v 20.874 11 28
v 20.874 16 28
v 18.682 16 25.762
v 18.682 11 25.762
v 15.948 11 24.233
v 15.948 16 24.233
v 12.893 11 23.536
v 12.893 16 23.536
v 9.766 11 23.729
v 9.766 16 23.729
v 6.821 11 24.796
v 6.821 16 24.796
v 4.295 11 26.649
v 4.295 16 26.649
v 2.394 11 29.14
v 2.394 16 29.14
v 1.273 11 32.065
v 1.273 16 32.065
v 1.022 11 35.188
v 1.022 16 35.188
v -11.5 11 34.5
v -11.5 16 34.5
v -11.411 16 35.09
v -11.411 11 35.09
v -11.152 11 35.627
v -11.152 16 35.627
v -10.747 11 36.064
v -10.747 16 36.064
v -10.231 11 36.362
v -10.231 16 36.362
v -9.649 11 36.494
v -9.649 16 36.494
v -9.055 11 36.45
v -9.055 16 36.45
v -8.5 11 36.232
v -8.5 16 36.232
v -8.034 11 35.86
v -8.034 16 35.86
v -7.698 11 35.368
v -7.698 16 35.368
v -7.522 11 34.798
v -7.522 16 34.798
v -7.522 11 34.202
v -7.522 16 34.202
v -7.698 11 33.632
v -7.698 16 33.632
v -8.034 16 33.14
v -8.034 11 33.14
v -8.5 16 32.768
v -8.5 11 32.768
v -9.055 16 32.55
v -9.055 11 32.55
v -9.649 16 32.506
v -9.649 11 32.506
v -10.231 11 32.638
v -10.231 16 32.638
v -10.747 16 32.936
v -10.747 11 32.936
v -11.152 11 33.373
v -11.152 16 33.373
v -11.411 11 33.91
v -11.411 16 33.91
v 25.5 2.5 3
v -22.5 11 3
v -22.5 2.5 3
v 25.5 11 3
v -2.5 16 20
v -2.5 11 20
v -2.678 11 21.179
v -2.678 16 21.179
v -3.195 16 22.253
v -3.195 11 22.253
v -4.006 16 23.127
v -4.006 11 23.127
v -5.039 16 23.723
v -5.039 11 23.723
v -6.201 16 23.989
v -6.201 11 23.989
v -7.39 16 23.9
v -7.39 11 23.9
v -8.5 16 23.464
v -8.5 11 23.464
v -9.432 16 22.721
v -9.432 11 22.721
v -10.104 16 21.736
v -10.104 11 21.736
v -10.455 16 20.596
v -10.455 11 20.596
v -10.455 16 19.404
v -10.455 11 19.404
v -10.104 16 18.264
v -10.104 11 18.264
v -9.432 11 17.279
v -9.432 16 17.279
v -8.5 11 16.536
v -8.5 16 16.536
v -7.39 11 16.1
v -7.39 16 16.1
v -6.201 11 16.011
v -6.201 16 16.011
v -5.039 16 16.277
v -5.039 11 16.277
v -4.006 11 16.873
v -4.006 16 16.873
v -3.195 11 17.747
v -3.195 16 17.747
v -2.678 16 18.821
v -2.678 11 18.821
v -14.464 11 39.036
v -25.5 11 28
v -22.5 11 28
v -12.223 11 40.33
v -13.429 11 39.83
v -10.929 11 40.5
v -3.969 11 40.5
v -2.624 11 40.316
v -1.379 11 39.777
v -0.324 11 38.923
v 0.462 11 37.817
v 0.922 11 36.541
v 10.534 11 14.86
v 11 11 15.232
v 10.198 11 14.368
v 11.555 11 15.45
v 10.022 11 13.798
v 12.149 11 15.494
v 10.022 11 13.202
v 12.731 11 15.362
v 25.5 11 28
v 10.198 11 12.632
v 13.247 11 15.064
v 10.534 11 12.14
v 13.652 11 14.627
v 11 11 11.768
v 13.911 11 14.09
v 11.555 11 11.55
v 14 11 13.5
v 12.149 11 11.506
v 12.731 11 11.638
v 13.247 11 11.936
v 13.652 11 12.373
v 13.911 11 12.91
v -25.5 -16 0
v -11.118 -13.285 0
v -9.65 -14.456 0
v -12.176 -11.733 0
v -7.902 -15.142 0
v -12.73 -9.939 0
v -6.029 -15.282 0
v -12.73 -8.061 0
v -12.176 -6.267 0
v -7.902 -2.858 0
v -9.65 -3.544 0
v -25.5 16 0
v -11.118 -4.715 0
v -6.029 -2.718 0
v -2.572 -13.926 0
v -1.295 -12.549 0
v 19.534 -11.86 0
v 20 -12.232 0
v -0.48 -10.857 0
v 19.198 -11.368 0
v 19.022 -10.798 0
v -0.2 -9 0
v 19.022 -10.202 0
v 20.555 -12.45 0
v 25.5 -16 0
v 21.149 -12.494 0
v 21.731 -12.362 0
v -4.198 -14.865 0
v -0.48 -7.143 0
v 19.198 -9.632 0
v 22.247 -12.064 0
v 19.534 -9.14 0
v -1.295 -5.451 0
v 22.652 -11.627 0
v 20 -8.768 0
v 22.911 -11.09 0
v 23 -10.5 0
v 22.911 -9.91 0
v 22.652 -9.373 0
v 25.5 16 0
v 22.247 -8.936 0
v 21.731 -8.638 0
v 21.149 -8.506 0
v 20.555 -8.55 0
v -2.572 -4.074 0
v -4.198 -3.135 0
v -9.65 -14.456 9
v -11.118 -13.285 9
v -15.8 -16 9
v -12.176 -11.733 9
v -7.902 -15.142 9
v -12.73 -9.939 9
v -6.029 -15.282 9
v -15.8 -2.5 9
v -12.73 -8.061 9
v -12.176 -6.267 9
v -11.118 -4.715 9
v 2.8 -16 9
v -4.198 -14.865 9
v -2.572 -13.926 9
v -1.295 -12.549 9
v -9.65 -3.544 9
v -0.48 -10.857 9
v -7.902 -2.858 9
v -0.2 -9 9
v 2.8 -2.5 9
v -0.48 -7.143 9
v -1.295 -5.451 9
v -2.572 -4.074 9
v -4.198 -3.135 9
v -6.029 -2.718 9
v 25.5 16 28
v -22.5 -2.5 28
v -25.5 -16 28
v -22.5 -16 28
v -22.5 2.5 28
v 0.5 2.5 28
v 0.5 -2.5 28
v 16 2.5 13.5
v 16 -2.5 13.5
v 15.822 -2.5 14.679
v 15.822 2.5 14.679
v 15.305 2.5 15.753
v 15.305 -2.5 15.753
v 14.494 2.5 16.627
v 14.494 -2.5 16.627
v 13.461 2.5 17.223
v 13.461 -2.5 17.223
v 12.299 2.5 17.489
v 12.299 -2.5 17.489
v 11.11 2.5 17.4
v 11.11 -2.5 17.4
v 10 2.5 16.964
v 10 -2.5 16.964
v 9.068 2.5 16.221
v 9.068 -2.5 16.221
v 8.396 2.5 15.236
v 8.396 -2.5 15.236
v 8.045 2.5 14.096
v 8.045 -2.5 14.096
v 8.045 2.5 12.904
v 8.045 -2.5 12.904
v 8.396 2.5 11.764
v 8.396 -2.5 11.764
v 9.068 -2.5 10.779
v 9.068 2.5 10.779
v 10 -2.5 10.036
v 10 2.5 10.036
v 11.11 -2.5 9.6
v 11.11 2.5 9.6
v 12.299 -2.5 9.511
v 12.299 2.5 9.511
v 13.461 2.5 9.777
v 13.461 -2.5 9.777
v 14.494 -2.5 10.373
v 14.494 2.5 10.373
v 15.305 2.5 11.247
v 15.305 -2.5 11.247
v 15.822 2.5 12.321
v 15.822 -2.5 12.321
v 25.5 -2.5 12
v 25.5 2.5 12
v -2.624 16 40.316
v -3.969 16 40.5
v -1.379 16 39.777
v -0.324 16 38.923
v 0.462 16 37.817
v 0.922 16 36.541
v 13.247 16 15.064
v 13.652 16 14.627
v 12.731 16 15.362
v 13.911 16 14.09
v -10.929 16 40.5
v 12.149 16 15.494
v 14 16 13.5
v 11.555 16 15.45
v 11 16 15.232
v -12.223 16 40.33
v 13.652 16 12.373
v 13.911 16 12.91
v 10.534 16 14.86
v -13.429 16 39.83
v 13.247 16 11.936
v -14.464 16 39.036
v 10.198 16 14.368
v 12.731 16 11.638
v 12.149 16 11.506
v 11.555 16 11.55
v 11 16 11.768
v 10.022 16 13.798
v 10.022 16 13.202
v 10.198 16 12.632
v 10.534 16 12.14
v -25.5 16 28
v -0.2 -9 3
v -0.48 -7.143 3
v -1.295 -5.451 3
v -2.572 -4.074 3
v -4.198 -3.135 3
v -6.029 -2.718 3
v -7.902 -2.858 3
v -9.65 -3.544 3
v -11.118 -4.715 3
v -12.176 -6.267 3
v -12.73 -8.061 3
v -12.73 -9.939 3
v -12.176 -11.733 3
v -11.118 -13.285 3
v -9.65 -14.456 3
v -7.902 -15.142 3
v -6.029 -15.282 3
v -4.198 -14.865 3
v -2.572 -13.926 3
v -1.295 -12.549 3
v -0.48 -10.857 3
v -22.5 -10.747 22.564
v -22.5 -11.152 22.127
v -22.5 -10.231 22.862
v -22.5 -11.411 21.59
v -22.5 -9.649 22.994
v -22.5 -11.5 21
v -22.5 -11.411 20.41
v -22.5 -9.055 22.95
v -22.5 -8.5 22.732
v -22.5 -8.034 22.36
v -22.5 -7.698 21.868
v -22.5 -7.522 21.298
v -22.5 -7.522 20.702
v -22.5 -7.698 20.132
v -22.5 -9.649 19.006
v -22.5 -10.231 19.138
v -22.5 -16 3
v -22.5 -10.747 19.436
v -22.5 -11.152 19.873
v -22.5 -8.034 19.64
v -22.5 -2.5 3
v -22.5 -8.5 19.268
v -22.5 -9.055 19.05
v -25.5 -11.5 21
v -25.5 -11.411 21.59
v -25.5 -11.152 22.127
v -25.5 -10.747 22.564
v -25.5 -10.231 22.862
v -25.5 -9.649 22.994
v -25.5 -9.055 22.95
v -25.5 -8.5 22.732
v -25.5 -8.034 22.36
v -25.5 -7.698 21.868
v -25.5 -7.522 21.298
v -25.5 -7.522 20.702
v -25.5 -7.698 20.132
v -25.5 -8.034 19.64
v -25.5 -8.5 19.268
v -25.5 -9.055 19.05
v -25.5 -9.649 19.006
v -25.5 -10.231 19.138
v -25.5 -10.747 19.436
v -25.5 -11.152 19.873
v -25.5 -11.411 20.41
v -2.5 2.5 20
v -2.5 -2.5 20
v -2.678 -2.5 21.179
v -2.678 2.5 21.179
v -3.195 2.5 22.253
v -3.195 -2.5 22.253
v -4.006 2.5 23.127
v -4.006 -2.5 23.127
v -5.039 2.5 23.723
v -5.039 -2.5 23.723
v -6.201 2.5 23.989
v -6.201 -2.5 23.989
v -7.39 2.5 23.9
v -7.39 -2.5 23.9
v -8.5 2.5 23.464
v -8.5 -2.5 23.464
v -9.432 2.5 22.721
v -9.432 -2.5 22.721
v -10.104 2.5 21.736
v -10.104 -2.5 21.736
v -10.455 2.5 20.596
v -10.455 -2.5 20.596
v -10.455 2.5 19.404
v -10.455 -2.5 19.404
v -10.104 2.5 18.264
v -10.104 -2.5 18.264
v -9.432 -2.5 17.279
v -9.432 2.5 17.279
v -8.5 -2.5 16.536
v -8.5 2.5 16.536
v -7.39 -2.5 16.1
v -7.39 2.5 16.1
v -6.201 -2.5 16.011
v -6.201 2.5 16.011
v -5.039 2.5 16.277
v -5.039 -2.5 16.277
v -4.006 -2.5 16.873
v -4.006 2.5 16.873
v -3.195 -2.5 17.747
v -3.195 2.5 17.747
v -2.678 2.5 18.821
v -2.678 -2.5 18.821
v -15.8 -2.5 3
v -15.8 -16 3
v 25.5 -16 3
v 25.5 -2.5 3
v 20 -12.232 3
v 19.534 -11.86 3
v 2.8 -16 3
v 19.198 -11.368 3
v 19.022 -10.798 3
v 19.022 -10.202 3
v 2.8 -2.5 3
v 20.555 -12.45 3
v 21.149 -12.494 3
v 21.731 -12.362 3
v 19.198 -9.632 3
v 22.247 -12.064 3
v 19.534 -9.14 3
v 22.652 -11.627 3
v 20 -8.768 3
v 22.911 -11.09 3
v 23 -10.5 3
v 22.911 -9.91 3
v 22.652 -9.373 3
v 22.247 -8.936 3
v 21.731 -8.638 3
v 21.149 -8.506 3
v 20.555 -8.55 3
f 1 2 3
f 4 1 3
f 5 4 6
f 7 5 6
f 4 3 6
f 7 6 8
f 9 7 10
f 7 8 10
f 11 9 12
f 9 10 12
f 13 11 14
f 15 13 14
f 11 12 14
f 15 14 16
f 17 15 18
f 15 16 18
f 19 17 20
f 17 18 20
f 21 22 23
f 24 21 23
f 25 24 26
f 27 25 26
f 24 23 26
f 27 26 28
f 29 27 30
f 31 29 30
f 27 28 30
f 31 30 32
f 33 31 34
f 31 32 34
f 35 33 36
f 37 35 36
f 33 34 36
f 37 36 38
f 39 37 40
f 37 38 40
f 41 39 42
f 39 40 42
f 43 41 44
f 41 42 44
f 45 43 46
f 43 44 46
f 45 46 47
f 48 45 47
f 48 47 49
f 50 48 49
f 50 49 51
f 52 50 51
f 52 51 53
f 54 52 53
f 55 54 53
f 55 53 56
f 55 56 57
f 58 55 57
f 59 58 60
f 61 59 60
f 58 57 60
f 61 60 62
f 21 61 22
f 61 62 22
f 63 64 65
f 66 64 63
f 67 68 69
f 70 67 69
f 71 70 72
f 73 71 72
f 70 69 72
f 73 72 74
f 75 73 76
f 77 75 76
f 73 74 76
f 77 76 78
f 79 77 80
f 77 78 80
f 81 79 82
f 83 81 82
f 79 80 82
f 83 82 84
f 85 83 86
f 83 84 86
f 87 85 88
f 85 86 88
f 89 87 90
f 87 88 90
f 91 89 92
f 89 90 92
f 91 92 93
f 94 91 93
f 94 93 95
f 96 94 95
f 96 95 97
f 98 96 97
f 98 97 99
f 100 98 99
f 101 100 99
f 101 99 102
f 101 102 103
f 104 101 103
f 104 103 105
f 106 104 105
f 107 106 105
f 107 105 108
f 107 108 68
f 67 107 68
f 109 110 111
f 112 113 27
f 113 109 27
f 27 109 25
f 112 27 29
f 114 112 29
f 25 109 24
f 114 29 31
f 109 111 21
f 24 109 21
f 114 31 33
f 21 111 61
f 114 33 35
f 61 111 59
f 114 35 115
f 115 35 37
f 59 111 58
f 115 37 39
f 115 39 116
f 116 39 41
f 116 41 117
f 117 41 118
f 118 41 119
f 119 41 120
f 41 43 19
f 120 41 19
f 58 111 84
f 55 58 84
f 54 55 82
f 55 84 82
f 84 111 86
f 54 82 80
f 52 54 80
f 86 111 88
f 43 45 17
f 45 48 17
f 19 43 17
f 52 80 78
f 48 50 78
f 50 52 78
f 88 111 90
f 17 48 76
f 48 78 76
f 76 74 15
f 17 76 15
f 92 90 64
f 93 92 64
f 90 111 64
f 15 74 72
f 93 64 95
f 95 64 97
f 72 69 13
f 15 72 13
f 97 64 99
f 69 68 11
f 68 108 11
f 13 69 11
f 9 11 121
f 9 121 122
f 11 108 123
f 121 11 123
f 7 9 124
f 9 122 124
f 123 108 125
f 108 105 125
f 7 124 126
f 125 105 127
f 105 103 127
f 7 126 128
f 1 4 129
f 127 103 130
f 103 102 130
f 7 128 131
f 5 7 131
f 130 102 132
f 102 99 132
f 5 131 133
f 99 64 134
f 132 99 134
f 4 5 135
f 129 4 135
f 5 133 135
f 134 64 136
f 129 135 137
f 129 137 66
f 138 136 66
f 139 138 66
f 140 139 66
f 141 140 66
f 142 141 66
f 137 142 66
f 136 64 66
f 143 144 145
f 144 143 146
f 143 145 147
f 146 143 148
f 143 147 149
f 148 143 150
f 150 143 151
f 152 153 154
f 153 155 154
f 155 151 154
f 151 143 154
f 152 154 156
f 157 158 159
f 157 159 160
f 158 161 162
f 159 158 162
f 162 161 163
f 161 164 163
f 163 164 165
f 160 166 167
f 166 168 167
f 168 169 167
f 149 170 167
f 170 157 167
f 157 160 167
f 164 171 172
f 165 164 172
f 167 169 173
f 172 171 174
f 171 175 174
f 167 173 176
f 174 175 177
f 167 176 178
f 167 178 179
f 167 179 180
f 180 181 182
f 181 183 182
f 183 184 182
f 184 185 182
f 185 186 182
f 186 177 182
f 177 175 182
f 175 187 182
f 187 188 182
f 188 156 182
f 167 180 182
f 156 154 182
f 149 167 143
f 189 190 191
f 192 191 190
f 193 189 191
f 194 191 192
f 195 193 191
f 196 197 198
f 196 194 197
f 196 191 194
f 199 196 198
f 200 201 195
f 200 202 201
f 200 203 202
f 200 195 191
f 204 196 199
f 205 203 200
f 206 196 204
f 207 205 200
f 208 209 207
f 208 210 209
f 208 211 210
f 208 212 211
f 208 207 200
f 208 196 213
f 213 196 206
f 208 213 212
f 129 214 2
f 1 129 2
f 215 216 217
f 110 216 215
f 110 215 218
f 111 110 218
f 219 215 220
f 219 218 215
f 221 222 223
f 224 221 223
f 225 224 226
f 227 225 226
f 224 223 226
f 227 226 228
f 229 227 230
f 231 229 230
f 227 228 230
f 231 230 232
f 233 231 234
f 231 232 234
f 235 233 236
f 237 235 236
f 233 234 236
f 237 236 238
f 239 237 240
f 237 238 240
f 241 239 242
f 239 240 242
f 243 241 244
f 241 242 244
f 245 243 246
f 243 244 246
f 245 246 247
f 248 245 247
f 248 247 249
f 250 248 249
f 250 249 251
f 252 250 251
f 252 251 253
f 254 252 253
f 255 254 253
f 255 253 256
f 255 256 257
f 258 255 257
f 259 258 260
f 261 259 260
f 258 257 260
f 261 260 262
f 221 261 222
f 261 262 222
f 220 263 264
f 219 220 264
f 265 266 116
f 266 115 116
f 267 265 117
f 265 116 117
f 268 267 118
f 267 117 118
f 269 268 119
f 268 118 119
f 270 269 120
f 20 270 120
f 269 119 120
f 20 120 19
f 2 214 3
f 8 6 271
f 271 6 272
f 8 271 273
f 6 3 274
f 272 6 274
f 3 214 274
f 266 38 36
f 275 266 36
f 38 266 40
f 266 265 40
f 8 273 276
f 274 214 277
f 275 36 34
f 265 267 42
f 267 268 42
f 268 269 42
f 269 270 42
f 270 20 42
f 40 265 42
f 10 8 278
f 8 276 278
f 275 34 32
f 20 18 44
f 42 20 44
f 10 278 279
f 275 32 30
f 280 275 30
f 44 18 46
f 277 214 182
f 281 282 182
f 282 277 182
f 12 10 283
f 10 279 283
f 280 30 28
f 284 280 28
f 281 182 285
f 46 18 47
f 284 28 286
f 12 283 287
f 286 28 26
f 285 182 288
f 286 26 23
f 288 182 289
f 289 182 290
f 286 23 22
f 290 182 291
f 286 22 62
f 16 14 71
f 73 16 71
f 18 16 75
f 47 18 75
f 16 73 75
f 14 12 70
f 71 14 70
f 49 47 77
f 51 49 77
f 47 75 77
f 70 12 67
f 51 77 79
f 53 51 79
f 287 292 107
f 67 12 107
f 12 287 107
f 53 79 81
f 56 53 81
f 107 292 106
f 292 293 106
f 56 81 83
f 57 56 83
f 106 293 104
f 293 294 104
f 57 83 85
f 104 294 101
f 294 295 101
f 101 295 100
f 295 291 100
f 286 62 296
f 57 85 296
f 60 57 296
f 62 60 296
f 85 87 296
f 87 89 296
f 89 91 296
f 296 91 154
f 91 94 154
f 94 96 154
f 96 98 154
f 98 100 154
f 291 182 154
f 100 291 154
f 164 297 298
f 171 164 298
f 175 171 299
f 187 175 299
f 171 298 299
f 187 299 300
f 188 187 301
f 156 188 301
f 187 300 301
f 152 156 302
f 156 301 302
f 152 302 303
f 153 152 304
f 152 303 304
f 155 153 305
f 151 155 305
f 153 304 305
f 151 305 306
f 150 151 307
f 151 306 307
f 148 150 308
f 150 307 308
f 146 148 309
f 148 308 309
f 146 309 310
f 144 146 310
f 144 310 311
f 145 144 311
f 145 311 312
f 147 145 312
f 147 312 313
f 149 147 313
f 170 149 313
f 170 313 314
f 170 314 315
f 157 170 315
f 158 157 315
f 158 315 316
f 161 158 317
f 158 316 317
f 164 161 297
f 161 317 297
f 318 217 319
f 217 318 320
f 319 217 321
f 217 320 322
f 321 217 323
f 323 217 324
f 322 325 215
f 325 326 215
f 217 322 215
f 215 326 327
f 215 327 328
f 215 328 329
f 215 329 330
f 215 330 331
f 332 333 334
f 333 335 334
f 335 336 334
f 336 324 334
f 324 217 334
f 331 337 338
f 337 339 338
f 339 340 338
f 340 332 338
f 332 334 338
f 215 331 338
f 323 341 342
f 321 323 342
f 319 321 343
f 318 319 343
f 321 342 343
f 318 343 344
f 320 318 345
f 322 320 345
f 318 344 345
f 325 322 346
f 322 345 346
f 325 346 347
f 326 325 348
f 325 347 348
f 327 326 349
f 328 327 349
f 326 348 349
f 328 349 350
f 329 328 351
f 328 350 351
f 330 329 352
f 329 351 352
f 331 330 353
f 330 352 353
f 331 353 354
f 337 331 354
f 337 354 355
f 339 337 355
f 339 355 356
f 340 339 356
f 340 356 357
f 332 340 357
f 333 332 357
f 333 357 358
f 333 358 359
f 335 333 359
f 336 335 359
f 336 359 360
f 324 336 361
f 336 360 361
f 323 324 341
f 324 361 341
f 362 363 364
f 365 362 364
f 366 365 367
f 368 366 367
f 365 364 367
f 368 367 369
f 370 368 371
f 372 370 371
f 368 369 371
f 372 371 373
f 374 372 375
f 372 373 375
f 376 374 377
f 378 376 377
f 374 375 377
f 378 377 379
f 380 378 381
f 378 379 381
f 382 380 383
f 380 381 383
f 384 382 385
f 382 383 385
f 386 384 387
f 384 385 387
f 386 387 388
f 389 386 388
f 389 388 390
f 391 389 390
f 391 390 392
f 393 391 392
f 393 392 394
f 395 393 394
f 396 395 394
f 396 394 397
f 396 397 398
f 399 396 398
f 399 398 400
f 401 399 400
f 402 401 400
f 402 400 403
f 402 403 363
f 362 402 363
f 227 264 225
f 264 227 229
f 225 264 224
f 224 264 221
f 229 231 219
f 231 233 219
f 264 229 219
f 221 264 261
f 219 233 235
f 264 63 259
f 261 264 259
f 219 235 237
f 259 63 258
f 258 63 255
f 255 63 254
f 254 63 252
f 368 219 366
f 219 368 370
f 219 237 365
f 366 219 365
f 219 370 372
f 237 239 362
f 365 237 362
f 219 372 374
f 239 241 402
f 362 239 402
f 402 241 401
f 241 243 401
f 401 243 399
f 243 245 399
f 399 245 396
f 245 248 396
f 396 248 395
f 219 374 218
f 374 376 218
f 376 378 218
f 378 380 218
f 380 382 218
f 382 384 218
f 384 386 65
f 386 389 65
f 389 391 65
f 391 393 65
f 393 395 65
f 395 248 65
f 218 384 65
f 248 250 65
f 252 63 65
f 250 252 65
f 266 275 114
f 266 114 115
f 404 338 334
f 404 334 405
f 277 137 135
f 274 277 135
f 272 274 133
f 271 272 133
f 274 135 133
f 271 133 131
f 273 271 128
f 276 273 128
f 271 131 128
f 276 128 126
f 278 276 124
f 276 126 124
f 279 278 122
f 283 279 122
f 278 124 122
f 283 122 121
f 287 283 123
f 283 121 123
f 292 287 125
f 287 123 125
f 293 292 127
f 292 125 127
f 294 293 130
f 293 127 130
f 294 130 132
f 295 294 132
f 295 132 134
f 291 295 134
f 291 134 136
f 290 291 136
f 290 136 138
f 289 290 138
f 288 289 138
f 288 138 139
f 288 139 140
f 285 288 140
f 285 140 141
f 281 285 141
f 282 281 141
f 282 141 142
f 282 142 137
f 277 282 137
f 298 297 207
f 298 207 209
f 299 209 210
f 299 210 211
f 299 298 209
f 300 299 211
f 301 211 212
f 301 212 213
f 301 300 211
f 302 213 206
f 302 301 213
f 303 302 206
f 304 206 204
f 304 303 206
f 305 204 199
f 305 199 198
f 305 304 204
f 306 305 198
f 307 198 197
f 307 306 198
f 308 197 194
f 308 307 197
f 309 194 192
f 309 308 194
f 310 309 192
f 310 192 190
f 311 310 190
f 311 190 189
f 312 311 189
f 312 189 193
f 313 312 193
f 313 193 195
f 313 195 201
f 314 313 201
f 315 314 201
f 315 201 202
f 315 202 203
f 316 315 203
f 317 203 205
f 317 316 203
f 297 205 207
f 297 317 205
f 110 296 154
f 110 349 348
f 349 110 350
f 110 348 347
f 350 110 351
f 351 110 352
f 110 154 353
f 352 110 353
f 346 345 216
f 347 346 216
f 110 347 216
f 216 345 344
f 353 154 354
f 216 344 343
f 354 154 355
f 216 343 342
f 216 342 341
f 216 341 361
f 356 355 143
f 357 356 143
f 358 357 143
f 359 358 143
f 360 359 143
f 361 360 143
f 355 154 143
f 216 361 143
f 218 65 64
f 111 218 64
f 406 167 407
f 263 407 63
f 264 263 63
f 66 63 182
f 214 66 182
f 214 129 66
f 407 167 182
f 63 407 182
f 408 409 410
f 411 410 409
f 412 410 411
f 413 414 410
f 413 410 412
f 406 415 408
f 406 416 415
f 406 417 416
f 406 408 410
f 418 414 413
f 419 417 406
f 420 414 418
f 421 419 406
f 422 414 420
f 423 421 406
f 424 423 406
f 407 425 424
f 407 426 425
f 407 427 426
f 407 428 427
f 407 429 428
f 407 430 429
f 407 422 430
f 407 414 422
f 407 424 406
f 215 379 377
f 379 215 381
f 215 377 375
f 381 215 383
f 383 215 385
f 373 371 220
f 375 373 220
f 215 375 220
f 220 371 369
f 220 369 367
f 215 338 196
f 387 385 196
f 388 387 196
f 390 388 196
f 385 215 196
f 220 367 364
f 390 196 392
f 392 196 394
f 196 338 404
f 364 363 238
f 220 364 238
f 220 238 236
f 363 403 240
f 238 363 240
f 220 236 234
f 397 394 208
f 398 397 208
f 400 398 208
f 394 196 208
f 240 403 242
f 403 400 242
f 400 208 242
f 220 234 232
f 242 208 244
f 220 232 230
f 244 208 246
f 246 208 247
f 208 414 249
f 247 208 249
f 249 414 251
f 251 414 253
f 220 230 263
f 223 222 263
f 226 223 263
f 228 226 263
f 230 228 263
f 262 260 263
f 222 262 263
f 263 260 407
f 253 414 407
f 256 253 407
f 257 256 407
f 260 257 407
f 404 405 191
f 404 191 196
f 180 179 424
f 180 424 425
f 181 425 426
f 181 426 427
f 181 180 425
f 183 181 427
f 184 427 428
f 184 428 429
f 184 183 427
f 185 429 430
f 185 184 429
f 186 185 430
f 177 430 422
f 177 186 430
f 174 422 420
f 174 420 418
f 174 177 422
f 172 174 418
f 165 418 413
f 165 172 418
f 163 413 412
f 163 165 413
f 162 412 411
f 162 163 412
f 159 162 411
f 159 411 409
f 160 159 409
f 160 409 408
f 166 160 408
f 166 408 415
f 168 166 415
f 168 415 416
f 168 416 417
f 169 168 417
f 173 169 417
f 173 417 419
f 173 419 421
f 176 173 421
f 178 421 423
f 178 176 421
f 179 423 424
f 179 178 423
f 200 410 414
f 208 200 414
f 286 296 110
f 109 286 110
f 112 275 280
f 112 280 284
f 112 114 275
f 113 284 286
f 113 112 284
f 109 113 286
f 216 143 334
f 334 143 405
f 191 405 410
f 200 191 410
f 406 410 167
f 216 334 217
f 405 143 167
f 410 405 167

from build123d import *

# Parameters (mm, degrees)
F0_W      = 51
F0_H      = 32
F0_R      = 2
F1_DEPTH  = 3
F3_DEPTH  = 25
F2_W      = 18.6
F2_H      = 13.5
F2_R      = 6.3
F4_DEPTH  = 6
F5_DEPTH  = 3
F6_SIZE2  = 16
F6_SIZE   = 25
F7_R      = 4
F8_DEPTH  = 18.501
F7_R_2    = 2
F9_DEPTH  = 18.501
F10_DEPTH = 5
F12_DEPTH = 12.5
F13_R     = 2
F14_DEPTH = 5
F15_SIZE  = 12.5
F16_R     = 5
F17_R     = 2
F18_DEPTH = 3


with BuildPart() as f1:
    # F0 (on Top) → F1 (new body)
    with BuildSketch(Plane.XY):
        Rectangle(F0_W, F0_H)
        with Locations((21, -10.5)):
            Circle(F0_R, mode=Mode.SUBTRACT)
    extrude(amount=F1_DEPTH)

    # F2 (on face) → F3 (join)
    with BuildSketch(Plane.XY.offset(3)):
        Polygon((-22.5, 2.5), (-22.5, 11), (25.5, 11), (25.5, 16), (-25.5, 16), (-25.5, -16), (-22.5, -16), (-22.5, -2.5), (-15.8, -2.5), (2.8, -2.5), (25.5, -2.5), (25.5, 2.5), align=None)
    extrude(amount=F3_DEPTH)

    # F2 (on face) → F4 (join)
    with BuildSketch(Plane.XY.offset(3)):
        with Locations((-6.5, -9.25)):
            Rectangle(F2_W, F2_H)
        with Locations((-6.5, -9)):
            Circle(F2_R, mode=Mode.SUBTRACT)
    extrude(amount=F4_DEPTH)

    # F5 (cut, through all): a face of the model
    f5_faces = [f1.faces().sort_by_distance(p)[0] for p in [
        (-6.5, -9, 3),
    ]]
    extrude(f5_faces, amount=-F5_DEPTH, mode=Mode.SUBTRACT)

    # F6
    f6_edges = [f1.edges().sort_by_distance(p)[0] for p in [
        (25.5, 0, 28),
    ]]
    f6_side = f1.faces().sort_by_distance((-23.10208, 6.75, 28))[0]
    chamfer(f6_edges, length=F6_SIZE, length2=F6_SIZE2, reference=f6_side)

    # F7 (on face) → F8 (cut, through all)
    with BuildSketch(Plane.XZ.offset(2.5)):
        with Locations((-6.5, 20)):
            Circle(F7_R)
    extrude(amount=-F8_DEPTH, mode=Mode.SUBTRACT)

    # F7 (on face) → F9 (cut, through all)
    with BuildSketch(Plane.XZ.offset(2.5)):
        with Locations((12, 13.5)):
            Circle(F7_R_2)
    extrude(amount=-F9_DEPTH, mode=Mode.SUBTRACT)

    # F7 (on face) → F10 (cut, through all)
    with BuildSketch(Plane.XZ.offset(2.5)):
        with Locations((12, 13.5)):
            Circle(F7_R)
        with Locations((12, 13.5)):
            Circle(F7_R_2, mode=Mode.SUBTRACT)
    extrude(amount=-F10_DEPTH, mode=Mode.SUBTRACT)

    # F11 (on face) → F12 (join)
    with BuildSketch(Plane.XY.offset(28)):
        Polygon((-25.5, 11), (-22.5, 11), (25.5, 11), (25.5, 16), (-25.5, 16), align=None)
    extrude(amount=F12_DEPTH)

    # F13 (on face) → F14 (cut, through all)
    with BuildSketch(Plane(origin=(0, 16, 0), x_dir=(-1, 0, 0), z_dir=(0, 1, 0))):
        with Locations((9.5, 34.5)):
            Circle(F13_R)
        with BuildLine():
            Line((-25.5, 28), (-20.8741196746, 28))
            ThreePointArc((-20.8741196746, 28), (-5.7476140898, 25.4497143454), (-2.7804555427, 40.5))
            Line((-2.7804555427, 40.5), (-25.5, 40.5))
            Line((-25.5, 40.5), (-25.5, 28))
        make_face()
    extrude(amount=-F14_DEPTH, mode=Mode.SUBTRACT)

    # F15
    f15_edges = [f1.edges().sort_by_distance(p)[0] for p in [
        (-25.5, 13.5, 40.5),
    ]]
    chamfer(f15_edges, length=F15_SIZE)

    # F16
    f16_edges = [f1.edges().sort_by_distance(p)[0] for p in [
        (2.780456, 13.5, 40.5),
        (-13, 13.5, 40.5),
    ]]
    fillet(f16_edges, radius=F16_R)

    # F17 (on face) → F18 (cut, through all)
    with BuildSketch(Plane(origin=(-25.5, 0, 0), x_dir=(0, -1, 0), z_dir=(-1, 0, 0))):
        with Locations((9.5, 21)):
            Circle(F17_R)
    extrude(amount=-F18_DEPTH, mode=Mode.SUBTRACT)


solid = f1.part
